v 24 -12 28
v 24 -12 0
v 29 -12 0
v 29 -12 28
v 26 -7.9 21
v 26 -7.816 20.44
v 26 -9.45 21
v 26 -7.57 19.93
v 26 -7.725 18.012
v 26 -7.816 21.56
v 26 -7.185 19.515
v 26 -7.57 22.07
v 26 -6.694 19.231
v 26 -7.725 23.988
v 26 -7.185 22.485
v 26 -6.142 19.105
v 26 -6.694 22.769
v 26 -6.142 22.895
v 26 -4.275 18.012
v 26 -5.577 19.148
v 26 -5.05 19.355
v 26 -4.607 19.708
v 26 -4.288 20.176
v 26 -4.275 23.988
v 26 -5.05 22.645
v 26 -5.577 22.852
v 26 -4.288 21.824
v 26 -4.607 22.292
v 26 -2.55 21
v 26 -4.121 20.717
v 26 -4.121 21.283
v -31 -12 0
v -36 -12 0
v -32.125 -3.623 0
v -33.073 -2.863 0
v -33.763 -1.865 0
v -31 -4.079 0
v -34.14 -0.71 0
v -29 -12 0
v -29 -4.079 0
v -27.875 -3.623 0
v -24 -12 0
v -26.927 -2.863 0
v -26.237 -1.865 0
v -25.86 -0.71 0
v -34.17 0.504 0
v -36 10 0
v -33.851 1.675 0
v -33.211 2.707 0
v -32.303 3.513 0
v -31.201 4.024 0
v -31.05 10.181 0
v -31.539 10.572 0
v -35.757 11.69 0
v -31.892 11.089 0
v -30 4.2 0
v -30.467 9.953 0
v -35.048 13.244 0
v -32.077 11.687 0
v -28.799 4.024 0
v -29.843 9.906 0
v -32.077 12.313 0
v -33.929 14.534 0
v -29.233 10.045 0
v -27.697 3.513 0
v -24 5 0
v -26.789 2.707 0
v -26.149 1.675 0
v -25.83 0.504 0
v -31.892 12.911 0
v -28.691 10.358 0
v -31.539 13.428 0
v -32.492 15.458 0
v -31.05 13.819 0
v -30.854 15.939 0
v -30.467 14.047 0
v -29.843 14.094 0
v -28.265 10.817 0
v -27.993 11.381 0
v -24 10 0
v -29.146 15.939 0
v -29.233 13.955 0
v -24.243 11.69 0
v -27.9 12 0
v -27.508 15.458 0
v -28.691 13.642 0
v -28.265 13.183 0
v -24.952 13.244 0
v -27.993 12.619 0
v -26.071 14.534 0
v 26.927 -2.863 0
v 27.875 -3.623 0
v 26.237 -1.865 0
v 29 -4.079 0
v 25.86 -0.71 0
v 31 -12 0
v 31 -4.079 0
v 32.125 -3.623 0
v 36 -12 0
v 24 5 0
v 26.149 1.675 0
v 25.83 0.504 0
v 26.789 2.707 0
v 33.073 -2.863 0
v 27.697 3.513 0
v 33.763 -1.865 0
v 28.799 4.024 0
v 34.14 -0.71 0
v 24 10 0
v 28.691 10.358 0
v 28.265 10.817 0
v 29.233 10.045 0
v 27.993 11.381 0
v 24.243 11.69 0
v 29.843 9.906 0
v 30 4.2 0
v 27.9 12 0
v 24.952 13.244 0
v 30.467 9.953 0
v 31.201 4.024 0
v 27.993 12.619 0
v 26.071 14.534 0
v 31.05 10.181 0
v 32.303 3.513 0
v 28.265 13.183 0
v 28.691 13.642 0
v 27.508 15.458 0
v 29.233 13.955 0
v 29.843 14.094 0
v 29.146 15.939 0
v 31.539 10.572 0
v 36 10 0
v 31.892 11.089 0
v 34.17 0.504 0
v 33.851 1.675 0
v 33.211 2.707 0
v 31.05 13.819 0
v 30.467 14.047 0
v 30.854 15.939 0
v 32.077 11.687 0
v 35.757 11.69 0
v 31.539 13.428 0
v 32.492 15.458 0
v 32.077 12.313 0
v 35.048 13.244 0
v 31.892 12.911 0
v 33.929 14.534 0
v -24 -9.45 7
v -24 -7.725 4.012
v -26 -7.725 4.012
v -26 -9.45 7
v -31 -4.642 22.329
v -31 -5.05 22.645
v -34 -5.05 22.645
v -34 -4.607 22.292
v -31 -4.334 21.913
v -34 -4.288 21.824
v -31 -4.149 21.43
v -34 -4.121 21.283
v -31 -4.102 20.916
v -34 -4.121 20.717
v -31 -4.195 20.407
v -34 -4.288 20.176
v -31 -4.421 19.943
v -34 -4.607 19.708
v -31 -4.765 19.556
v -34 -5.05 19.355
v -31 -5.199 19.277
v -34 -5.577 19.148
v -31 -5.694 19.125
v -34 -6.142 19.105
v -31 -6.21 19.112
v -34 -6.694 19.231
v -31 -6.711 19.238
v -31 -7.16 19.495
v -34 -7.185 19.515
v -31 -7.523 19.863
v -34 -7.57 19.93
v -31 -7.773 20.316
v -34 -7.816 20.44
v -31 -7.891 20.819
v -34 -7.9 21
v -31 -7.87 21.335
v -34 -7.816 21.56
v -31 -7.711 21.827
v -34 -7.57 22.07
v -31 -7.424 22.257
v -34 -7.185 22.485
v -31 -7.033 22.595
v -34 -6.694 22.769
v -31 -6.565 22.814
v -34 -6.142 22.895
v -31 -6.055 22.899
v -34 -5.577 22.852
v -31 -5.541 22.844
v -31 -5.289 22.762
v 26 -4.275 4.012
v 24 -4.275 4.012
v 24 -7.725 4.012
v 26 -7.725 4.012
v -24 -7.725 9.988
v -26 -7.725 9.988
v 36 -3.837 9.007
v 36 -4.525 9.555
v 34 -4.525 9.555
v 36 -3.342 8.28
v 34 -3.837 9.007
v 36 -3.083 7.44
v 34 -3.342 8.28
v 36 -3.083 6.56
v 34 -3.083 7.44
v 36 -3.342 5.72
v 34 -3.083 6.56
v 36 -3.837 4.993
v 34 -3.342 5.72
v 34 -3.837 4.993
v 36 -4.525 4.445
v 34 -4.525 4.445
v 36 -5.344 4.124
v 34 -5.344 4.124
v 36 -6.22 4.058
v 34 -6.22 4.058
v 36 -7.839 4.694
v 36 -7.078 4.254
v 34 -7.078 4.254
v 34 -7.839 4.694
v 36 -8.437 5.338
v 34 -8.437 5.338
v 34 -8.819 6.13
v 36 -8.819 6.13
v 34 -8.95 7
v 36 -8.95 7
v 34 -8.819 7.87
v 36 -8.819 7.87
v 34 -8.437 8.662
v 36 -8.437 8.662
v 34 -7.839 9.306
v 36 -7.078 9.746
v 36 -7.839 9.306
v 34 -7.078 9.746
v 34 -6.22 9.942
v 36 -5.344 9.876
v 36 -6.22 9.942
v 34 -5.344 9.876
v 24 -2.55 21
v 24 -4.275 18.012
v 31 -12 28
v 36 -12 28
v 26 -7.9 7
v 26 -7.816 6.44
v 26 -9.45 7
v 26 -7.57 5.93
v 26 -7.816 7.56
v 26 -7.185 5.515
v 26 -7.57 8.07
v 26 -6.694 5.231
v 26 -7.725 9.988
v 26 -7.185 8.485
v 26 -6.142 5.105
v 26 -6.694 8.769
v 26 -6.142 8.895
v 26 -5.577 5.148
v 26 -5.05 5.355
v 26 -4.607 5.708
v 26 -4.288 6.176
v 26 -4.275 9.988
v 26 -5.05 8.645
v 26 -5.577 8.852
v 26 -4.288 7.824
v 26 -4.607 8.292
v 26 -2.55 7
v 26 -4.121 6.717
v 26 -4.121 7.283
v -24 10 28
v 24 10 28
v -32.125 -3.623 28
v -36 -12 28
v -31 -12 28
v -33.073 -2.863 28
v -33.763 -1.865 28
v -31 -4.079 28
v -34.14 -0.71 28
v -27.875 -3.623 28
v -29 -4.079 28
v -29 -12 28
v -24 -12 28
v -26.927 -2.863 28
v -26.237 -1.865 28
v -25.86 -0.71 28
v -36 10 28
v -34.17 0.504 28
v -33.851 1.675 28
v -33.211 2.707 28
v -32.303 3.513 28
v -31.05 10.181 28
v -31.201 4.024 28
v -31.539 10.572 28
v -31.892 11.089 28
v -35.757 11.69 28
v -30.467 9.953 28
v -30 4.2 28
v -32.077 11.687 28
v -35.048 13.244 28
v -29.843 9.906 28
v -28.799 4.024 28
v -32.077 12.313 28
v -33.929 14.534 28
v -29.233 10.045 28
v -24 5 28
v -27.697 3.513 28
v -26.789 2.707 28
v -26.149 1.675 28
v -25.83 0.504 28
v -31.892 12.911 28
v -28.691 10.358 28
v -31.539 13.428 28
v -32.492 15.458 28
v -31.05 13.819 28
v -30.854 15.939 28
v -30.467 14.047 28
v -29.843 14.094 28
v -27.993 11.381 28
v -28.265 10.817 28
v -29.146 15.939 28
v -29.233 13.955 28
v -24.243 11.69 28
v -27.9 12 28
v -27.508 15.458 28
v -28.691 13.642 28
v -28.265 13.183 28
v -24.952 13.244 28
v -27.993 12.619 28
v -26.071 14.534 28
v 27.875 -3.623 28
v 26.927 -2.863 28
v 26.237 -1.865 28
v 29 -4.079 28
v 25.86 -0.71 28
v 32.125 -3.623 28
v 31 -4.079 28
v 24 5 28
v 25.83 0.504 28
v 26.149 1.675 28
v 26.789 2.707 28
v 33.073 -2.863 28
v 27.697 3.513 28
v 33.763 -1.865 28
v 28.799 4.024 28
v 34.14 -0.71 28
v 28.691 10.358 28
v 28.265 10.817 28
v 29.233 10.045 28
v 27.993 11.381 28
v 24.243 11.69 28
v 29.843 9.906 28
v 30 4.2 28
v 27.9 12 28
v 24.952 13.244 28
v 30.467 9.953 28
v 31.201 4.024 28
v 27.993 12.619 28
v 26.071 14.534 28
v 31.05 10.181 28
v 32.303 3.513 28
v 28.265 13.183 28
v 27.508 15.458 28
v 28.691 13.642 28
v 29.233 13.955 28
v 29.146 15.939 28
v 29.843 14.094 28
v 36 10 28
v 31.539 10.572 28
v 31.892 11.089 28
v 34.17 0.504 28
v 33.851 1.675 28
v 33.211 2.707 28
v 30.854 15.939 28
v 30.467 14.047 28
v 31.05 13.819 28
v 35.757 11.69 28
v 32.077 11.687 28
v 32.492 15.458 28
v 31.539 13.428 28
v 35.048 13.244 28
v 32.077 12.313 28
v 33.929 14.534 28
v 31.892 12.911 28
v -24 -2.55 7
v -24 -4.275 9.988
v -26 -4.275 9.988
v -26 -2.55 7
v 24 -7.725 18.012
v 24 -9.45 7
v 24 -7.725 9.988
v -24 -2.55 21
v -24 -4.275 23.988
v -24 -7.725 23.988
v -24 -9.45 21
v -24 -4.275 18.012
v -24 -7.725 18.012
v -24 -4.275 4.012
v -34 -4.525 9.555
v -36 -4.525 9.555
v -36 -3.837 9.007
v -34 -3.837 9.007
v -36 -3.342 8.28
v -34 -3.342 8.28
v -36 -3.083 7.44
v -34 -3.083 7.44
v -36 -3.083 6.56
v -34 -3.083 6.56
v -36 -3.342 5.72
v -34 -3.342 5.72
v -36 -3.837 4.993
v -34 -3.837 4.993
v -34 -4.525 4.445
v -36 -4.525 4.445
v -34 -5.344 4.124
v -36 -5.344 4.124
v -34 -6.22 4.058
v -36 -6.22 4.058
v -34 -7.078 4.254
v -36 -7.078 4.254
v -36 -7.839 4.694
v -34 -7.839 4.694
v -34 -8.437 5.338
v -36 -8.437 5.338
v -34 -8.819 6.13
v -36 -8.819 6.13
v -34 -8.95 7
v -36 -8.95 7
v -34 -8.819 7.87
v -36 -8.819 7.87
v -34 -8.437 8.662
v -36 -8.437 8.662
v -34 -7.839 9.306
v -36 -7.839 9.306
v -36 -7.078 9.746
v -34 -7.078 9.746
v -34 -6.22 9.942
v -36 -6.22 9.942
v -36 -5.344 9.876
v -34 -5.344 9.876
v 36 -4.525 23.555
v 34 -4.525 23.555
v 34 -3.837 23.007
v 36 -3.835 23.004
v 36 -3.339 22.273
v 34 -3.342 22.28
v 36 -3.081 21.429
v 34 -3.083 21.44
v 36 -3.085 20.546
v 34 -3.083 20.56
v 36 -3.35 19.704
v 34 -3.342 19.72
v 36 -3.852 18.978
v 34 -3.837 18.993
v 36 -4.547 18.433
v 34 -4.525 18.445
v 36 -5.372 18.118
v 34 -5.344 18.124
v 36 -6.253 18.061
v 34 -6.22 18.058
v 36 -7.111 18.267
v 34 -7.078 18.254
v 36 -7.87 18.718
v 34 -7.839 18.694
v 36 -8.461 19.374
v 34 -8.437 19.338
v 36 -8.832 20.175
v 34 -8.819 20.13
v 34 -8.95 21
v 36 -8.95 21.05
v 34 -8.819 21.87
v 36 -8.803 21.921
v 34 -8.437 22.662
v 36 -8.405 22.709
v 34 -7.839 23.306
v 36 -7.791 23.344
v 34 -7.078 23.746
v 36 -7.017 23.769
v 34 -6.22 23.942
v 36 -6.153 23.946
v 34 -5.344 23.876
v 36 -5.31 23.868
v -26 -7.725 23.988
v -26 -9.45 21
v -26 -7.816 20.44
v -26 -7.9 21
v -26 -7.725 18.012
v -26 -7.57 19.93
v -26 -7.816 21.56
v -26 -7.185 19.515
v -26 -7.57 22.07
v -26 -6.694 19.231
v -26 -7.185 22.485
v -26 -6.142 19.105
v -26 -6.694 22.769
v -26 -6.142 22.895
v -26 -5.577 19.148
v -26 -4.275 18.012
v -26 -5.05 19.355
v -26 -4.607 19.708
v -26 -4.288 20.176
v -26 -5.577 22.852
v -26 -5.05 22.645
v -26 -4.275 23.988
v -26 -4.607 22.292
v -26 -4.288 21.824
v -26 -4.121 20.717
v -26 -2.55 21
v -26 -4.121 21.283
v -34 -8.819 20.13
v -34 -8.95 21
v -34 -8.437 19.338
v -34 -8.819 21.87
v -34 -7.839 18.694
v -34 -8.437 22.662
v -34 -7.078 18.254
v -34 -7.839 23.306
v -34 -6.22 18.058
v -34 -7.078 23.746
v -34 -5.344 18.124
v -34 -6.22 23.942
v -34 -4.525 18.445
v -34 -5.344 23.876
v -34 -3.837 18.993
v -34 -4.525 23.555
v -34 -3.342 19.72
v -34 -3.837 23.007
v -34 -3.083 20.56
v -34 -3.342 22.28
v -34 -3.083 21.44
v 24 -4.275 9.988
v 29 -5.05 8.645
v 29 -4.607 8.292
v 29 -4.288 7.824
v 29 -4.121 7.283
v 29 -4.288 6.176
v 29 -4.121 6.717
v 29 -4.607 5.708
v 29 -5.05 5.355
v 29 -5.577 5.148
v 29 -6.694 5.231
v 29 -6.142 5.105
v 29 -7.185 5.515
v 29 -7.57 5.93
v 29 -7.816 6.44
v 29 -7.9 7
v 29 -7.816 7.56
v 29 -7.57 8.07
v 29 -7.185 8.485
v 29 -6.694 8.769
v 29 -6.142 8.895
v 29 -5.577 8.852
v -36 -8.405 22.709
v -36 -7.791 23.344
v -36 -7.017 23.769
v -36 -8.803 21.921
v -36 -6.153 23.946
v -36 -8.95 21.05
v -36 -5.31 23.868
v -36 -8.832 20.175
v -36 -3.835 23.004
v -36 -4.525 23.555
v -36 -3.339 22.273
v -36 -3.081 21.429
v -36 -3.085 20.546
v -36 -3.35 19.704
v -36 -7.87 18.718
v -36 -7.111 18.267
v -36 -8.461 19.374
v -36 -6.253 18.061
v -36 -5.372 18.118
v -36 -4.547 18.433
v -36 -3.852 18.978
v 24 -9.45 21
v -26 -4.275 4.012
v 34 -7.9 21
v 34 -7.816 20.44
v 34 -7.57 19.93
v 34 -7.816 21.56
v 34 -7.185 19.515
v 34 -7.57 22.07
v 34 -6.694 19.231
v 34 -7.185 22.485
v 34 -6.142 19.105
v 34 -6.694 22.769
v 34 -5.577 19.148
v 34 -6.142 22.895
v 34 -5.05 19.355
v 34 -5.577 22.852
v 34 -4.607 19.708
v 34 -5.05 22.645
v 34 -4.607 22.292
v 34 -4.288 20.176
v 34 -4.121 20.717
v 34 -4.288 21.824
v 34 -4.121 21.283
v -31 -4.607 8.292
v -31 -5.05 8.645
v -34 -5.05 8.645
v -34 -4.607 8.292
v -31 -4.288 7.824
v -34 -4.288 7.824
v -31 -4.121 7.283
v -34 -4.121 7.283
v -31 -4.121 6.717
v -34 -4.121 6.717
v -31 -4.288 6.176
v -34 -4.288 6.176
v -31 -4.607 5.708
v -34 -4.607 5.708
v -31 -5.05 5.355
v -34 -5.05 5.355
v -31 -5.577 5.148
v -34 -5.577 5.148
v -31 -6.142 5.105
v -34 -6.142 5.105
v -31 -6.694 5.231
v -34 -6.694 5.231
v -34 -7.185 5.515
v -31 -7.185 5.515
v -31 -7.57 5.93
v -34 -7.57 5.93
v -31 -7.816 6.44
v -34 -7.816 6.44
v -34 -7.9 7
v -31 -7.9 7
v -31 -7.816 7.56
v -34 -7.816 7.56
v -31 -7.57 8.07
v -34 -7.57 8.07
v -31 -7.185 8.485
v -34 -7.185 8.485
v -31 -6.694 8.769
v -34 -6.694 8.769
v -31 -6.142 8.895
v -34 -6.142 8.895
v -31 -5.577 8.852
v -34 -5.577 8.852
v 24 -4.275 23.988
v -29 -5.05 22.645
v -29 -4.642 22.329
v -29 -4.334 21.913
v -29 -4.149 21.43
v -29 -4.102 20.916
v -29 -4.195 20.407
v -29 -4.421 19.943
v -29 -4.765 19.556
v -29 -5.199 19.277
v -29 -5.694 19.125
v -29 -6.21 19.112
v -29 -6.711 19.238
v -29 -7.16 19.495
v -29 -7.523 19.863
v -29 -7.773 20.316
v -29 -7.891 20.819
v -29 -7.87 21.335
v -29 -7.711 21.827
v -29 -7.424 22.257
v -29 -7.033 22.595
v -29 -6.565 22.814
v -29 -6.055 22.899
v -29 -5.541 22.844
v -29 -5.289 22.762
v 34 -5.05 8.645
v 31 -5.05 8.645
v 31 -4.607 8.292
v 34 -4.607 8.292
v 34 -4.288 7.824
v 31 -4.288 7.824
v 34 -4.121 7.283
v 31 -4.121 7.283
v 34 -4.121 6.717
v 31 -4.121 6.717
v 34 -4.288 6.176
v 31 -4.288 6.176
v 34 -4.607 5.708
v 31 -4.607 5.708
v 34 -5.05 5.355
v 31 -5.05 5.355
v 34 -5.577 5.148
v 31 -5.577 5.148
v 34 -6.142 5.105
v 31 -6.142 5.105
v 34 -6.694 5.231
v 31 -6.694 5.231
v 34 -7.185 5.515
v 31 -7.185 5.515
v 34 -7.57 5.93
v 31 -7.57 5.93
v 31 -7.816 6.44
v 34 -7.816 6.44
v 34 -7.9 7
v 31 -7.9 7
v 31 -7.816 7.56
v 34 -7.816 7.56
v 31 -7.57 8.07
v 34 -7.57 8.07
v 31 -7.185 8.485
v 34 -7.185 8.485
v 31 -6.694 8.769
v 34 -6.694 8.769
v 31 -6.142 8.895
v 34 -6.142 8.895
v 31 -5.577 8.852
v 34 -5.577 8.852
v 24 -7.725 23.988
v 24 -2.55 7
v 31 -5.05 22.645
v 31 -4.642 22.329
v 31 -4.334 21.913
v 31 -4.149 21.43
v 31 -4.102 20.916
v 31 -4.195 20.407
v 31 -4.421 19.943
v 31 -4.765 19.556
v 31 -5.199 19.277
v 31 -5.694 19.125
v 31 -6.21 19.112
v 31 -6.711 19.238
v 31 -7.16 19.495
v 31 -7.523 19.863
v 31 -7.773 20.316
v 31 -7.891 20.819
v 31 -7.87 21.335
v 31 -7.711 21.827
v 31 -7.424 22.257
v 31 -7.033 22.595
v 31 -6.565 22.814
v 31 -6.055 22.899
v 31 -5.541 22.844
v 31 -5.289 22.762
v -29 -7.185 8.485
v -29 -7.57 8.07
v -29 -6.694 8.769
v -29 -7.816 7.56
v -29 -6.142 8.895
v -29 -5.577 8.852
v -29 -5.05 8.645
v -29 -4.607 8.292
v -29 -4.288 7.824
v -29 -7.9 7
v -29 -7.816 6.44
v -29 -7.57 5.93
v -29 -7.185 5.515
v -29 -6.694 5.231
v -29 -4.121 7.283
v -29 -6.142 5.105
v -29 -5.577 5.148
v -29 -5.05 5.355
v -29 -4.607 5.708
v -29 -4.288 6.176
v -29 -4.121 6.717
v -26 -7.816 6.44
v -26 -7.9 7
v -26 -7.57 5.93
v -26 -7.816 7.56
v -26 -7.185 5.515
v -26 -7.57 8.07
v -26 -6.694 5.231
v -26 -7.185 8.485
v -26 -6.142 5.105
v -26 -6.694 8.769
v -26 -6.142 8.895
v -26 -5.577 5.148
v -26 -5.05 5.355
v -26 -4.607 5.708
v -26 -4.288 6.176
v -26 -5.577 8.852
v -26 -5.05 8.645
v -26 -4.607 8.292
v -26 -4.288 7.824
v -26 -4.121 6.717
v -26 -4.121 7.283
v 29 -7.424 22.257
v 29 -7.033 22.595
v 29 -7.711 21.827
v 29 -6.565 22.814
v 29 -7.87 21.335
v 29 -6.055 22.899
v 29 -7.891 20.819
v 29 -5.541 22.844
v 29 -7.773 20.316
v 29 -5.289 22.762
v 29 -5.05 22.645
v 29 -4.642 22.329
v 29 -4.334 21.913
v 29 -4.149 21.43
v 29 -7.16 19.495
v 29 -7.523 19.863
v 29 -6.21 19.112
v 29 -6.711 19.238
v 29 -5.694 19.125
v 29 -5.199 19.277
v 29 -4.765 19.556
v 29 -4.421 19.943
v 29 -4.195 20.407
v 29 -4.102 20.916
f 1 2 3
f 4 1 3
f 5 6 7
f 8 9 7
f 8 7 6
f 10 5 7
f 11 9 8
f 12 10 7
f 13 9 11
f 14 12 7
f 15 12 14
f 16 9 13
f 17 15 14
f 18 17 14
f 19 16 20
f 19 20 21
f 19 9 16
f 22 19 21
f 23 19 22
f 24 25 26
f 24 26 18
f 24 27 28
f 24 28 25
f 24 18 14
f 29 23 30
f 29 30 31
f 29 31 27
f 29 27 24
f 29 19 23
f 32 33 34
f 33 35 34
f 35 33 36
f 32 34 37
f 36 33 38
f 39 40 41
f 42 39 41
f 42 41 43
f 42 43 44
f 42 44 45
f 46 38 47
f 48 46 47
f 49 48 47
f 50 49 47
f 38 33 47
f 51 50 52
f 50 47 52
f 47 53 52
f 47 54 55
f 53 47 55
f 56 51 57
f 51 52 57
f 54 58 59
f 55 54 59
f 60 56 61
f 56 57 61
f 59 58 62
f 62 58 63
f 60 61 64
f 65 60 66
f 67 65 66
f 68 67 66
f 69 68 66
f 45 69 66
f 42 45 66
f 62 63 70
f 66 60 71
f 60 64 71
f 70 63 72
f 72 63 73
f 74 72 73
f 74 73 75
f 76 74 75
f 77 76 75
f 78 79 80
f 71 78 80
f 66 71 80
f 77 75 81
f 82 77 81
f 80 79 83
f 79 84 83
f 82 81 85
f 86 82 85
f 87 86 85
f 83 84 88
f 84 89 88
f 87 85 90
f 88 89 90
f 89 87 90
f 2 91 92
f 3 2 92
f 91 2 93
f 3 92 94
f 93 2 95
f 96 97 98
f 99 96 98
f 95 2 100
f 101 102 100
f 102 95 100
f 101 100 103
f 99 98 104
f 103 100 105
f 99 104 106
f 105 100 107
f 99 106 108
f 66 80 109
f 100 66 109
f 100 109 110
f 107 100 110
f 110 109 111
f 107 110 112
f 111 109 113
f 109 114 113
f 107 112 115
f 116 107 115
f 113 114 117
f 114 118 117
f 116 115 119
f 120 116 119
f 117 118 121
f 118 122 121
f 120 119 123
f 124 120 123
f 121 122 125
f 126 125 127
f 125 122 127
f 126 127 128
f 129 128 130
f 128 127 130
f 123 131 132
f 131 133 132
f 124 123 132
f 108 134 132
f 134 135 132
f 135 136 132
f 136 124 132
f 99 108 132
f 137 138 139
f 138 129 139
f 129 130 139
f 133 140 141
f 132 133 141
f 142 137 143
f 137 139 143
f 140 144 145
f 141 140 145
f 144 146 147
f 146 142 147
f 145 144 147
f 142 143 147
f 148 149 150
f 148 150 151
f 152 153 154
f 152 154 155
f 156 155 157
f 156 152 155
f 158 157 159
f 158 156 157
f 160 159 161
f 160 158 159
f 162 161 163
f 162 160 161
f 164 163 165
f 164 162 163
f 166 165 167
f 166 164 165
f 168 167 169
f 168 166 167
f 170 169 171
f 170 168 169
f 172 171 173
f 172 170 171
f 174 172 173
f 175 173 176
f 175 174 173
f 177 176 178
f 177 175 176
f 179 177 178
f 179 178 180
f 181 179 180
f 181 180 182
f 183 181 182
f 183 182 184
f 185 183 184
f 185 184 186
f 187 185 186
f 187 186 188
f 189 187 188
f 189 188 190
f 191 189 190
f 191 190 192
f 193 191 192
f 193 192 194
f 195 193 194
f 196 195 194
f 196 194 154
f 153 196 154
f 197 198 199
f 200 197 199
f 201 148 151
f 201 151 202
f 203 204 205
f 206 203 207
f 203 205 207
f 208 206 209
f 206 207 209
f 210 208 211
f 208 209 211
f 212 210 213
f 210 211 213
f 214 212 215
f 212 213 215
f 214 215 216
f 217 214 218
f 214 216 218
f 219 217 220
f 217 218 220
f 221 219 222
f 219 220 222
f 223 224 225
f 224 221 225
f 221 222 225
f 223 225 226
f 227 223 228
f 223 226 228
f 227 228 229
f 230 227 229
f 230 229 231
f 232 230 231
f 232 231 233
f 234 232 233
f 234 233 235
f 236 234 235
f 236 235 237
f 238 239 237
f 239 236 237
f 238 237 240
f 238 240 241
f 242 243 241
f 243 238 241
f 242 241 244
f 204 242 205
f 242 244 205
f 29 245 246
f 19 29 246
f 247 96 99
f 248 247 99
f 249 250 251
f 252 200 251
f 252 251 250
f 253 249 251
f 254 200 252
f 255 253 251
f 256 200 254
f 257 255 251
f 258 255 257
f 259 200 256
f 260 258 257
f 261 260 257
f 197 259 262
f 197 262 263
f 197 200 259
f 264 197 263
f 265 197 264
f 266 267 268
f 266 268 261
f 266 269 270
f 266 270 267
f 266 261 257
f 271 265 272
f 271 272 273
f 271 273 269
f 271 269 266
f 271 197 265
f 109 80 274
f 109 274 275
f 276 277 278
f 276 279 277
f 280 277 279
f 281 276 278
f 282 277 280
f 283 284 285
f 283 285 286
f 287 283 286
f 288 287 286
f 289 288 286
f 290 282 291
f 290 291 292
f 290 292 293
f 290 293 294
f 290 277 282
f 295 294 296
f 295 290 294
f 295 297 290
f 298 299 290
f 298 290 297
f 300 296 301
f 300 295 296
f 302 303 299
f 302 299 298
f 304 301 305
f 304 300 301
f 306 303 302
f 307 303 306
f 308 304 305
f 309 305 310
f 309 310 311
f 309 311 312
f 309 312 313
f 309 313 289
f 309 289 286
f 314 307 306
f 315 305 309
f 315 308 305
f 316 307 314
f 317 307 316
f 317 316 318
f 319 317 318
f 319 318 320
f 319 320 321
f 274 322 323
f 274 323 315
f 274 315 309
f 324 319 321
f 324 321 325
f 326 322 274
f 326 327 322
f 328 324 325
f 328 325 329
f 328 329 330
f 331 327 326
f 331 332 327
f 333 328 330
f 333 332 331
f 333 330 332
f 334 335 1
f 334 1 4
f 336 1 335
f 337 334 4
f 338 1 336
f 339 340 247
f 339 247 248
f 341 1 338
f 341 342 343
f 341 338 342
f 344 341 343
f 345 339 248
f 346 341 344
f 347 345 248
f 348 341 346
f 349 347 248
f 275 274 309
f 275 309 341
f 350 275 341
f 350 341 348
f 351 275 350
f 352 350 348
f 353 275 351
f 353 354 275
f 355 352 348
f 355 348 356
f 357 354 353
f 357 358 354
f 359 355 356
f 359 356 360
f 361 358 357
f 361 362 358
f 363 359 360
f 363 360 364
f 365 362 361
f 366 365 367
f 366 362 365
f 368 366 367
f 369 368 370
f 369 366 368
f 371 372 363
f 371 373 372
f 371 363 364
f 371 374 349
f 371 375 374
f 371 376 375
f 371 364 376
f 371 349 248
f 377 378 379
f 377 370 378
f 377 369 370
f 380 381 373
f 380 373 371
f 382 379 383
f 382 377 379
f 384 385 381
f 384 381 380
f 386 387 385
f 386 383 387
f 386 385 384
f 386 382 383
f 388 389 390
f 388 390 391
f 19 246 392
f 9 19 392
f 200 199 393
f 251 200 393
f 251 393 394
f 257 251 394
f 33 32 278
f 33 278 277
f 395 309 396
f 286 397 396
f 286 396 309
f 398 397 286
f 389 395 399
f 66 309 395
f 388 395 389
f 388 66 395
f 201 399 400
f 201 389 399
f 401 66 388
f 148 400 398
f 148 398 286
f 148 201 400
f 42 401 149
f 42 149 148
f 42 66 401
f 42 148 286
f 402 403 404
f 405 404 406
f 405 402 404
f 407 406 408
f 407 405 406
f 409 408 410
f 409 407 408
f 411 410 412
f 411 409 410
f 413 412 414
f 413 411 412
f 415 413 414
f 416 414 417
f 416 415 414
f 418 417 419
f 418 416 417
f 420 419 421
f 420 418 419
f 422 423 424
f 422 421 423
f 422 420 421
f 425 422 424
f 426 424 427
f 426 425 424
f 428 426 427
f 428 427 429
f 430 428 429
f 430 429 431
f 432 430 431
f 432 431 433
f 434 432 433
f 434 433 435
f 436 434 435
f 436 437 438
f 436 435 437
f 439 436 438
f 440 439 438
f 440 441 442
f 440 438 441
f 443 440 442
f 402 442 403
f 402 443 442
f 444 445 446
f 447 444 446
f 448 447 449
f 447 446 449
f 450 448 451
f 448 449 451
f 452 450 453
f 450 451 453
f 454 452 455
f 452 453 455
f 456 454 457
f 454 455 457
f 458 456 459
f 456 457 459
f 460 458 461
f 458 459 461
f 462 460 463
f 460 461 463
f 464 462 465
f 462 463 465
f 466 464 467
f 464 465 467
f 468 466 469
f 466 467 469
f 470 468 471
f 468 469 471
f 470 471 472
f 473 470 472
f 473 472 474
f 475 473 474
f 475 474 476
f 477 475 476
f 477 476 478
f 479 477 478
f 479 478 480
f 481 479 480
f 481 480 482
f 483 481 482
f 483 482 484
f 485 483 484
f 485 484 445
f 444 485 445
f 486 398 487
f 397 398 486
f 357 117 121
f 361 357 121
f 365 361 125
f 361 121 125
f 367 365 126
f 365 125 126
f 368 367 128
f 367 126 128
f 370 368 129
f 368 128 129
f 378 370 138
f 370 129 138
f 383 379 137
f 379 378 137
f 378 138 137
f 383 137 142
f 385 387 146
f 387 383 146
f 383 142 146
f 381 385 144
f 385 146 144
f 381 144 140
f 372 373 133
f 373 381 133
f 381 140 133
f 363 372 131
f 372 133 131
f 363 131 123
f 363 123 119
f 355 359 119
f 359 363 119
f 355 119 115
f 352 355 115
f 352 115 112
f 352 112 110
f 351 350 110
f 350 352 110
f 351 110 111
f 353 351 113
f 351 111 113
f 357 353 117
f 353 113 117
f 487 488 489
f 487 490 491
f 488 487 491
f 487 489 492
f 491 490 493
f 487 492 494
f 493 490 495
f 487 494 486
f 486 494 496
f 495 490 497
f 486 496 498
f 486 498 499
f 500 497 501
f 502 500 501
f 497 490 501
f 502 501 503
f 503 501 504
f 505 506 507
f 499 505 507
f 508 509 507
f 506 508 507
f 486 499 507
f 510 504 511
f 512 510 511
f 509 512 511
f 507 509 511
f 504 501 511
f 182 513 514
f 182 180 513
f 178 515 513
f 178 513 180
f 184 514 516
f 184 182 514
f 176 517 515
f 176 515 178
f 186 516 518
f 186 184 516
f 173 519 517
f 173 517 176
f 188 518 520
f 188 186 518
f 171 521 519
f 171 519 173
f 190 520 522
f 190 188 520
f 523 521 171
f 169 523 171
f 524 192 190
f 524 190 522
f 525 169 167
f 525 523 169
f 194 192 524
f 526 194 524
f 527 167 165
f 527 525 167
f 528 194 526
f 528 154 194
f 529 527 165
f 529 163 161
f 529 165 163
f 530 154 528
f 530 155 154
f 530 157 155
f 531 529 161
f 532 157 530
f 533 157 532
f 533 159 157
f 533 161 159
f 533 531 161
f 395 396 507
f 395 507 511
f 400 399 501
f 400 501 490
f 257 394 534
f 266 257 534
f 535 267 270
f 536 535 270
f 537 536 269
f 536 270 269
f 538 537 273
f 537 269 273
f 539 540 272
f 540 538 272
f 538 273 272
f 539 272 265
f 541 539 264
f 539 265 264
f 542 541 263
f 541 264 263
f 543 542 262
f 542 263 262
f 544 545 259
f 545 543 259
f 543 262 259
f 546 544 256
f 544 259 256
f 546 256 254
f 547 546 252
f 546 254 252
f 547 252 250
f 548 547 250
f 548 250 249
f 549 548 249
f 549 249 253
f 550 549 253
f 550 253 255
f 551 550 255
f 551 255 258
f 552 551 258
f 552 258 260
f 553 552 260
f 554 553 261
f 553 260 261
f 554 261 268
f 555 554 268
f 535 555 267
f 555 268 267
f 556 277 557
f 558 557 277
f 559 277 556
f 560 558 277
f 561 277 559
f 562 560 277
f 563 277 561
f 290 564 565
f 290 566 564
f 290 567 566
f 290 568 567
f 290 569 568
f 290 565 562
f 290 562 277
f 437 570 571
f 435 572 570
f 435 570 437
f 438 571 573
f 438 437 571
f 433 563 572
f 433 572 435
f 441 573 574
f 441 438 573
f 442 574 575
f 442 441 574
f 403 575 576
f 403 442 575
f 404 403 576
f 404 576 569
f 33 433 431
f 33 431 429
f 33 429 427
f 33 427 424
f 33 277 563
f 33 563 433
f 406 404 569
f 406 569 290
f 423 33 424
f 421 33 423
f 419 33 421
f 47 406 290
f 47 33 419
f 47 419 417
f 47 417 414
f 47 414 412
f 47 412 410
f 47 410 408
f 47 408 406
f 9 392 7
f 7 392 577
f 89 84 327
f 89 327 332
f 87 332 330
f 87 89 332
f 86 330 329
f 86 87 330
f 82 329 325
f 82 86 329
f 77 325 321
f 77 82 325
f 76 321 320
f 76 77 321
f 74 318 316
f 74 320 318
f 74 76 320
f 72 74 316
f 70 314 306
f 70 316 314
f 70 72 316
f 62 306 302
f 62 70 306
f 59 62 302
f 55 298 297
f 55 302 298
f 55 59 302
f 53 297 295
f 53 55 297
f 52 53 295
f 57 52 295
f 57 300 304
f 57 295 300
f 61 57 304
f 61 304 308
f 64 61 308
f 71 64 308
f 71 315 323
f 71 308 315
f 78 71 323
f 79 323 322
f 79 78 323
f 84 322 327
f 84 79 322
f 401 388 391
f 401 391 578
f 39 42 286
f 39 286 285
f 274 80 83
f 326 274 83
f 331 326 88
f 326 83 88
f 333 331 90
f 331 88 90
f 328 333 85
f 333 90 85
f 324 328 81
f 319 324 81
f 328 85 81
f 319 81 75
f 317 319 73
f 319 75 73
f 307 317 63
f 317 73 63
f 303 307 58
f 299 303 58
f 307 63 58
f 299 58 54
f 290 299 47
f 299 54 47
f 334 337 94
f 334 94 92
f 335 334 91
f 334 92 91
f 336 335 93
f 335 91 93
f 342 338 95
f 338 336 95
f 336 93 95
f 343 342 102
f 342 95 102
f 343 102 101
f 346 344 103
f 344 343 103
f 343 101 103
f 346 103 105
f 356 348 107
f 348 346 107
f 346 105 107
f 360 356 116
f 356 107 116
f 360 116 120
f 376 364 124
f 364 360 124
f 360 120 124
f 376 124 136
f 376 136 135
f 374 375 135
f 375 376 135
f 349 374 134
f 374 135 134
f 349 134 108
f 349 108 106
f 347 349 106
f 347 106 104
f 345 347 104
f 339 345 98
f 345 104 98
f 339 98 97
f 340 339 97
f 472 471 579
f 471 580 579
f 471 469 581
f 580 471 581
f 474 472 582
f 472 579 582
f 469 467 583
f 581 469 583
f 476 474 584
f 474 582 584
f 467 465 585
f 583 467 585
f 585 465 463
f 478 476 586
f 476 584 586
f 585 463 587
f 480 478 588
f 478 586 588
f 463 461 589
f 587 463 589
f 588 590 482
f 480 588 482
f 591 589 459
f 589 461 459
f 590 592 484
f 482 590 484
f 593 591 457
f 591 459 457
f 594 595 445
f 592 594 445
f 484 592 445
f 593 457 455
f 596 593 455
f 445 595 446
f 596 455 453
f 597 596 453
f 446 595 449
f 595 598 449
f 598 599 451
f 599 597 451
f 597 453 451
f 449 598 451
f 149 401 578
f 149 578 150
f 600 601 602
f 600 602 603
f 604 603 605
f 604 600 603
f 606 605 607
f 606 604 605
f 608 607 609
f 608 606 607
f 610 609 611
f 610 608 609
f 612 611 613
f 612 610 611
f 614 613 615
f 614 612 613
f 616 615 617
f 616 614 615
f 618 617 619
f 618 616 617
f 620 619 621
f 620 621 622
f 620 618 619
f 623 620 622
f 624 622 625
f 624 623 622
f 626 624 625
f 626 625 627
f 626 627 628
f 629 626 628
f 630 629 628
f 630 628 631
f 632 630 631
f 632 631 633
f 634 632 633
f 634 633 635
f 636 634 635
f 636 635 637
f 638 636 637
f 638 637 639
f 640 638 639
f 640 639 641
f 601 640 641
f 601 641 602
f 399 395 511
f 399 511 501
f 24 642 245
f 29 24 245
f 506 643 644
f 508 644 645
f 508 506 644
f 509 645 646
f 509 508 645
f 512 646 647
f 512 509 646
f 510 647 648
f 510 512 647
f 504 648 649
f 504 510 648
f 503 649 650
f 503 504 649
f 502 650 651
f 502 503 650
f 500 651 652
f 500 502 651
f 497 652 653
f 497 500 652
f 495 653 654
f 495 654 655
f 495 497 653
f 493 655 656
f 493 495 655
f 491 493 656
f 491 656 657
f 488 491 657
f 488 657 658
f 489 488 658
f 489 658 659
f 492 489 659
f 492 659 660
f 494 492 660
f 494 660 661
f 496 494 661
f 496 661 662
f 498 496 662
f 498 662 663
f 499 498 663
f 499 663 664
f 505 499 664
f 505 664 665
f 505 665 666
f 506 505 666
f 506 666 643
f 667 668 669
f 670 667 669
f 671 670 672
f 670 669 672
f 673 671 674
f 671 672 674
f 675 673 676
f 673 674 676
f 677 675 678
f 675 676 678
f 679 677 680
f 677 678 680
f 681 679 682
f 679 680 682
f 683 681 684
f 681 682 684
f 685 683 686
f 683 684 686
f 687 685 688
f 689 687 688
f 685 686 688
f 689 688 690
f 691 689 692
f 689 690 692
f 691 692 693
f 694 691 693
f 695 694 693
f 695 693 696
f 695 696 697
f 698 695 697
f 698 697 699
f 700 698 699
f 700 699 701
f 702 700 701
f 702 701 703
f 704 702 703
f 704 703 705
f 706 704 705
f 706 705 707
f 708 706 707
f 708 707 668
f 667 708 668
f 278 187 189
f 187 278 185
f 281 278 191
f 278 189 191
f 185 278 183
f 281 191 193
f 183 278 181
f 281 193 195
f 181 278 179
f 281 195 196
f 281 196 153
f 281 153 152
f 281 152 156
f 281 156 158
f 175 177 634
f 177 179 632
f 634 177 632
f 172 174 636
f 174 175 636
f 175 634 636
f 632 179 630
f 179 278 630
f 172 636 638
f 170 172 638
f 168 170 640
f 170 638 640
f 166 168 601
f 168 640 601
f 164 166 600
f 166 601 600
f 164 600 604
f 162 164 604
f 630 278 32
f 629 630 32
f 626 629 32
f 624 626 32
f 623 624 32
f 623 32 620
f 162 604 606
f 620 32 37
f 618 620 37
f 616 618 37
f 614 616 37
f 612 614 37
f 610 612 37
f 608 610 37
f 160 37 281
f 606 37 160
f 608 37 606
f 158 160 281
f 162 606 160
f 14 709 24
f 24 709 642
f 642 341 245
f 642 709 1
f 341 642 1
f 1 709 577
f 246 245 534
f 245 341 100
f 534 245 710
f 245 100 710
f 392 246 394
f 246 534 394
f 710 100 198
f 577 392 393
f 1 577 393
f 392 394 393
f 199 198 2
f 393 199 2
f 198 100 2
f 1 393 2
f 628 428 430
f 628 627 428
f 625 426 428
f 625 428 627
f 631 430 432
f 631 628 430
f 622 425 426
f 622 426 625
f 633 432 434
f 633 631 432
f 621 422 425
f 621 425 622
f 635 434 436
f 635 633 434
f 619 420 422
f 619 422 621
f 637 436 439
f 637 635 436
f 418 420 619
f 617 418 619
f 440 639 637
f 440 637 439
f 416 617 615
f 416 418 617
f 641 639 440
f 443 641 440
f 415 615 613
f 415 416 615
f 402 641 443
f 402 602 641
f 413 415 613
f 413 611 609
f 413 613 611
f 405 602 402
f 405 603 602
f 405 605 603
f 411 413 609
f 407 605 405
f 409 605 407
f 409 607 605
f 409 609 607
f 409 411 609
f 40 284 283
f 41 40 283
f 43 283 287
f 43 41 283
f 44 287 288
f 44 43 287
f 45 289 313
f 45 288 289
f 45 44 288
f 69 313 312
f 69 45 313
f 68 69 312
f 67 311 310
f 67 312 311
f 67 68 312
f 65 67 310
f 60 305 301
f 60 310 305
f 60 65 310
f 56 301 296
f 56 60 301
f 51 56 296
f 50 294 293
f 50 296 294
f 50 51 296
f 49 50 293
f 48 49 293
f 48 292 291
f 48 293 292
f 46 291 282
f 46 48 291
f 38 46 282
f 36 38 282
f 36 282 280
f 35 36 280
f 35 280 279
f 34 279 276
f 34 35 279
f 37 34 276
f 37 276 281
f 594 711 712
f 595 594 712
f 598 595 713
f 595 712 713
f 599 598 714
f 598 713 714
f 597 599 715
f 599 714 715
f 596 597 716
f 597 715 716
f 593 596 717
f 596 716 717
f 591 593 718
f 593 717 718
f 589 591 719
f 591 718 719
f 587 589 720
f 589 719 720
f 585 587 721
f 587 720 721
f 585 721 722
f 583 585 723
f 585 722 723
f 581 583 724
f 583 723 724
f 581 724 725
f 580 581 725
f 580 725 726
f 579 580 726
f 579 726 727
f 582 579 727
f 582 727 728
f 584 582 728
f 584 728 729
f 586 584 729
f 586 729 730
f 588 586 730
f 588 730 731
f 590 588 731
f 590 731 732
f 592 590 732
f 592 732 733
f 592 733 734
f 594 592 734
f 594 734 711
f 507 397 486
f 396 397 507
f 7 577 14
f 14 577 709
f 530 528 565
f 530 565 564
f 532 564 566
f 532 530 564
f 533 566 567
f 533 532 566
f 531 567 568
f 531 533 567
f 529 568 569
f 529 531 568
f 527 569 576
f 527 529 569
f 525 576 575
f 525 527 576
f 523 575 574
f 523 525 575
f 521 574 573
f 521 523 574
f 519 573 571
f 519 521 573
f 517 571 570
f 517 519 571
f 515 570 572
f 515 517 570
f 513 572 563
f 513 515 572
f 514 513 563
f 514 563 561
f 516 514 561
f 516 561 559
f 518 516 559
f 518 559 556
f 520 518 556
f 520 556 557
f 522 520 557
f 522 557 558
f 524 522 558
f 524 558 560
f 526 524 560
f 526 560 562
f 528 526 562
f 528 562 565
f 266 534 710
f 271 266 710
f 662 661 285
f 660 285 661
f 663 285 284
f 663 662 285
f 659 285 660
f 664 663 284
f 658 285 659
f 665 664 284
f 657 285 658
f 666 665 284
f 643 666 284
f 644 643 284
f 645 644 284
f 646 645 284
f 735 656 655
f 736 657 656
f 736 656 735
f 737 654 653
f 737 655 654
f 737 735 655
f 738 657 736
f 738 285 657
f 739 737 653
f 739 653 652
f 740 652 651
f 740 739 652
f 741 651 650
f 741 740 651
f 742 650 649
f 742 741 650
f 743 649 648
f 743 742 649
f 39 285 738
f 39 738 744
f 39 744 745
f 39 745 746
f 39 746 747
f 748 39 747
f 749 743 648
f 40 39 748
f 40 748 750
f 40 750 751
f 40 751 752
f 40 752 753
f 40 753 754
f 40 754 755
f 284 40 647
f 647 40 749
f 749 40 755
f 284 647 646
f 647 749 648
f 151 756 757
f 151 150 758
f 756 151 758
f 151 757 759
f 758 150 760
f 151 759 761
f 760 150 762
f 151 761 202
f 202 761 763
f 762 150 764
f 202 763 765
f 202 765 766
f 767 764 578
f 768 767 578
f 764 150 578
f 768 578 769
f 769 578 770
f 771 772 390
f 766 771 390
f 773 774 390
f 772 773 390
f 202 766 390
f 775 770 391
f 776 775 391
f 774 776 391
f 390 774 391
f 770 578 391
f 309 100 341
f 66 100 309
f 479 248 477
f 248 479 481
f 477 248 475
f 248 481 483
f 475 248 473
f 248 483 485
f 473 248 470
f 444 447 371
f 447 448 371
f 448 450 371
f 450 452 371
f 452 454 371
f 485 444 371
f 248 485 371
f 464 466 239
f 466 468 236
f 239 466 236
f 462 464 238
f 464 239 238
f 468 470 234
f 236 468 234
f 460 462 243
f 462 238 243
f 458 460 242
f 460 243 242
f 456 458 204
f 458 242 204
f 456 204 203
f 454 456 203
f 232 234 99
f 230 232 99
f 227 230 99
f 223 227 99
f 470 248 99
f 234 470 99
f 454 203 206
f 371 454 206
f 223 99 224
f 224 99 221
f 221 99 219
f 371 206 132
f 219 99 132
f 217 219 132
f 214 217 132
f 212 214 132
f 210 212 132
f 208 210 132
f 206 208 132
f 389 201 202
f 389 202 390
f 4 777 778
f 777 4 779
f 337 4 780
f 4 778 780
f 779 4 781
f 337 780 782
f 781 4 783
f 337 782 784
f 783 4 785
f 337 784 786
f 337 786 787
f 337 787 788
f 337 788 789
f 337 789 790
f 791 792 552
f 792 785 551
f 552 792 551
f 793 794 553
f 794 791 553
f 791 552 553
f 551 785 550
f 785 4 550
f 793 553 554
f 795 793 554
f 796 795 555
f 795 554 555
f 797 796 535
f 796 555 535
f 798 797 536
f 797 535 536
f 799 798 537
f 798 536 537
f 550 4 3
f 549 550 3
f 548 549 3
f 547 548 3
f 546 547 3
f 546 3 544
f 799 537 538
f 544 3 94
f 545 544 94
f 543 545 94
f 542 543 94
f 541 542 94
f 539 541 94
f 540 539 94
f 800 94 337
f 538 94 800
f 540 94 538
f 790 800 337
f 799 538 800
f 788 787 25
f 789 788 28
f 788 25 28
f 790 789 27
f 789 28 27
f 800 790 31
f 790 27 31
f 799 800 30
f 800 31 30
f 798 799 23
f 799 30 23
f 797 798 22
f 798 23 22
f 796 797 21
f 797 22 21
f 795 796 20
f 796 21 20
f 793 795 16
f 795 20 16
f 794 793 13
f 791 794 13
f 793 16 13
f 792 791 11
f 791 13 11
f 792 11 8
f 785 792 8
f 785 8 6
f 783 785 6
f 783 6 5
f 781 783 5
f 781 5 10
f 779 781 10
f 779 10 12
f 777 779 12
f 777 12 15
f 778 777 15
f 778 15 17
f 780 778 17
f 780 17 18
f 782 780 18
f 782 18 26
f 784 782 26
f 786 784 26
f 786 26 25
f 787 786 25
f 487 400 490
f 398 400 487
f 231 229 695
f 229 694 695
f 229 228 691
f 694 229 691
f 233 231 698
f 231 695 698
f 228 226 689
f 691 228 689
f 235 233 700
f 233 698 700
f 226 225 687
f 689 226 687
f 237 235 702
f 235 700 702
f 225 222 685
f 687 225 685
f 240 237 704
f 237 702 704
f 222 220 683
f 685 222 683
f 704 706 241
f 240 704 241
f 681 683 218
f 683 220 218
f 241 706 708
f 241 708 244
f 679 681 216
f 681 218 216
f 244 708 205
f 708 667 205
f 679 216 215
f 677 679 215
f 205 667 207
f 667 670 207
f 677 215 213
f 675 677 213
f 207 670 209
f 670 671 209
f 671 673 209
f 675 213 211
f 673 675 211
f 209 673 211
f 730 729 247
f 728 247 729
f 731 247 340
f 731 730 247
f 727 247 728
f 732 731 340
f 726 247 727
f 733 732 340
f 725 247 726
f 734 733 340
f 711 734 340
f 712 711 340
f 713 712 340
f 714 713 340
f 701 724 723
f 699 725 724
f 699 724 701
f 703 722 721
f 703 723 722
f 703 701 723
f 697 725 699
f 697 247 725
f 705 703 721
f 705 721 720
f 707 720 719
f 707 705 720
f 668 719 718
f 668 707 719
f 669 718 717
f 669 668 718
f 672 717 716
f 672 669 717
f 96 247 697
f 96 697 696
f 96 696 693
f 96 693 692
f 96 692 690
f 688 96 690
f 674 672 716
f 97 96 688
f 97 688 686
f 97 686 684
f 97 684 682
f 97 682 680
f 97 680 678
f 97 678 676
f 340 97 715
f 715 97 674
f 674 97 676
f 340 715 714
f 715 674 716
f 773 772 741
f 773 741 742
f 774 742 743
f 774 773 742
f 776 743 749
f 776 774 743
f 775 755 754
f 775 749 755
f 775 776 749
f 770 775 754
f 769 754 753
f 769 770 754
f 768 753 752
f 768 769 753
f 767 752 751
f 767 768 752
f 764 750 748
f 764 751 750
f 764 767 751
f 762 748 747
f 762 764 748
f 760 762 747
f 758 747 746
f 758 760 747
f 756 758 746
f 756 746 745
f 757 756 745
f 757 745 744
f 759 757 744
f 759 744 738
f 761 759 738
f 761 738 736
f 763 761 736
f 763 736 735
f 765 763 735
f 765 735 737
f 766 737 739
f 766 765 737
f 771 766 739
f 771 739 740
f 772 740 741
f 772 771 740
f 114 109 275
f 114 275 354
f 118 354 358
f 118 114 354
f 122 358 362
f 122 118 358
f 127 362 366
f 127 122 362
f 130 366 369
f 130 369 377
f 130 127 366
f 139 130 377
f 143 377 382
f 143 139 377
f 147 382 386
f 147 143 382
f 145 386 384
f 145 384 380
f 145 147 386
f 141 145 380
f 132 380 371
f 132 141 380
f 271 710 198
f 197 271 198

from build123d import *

# Parameters (mm, degrees)
CYLINDER001_R          = 2.1
CYLINDER001_DEPTH      = 30
CYLINDER003_R          = 2.95
CYLINDER003_DEPTH      = 4
CYLINDER002_R          = 1.9
CYLINDER002_DEPTH      = 10
PRISM_DEPTH            = 3
FUSION_ROLL_ANGLE      = -90
FUSION_PITCH_ANGLE     = -60
FUSION_PLACEMENT_ANGLE = 90
CLONE_ROLL_ANGLE       = -3.3e-05
CLONE_PITCH_ANGLE      = -2.6e-05
CLONE_PLACEMENT_ANGLE  = 7e-06
SKETCH001_W            = 2
SKETCH001_H            = 14
PAD001_DEPTH           = 30
CYLINDER_R             = 4.2
CYLINDER_DEPTH         = 30
PAD_DEPTH              = 28


with BuildPart() as top_screw_cut:
    # Cylinder001 → Cylinder001 (new body)
    with BuildSketch(Plane(origin=(-30, 12, -1), x_dir=(1, 0, 0), z_dir=(0, 0, 1))):
        Circle(CYLINDER001_R)
    extrude(amount=CYLINDER001_DEPTH)


with BuildPart() as cylinder001:
    # Cylinder003 → Cylinder003 (new body)
    with BuildSketch(Plane.XY.offset(10)):
        Circle(CYLINDER003_R)
    extrude(amount=CYLINDER003_DEPTH)


with BuildPart() as cylinder:
    # Cylinder002 → Cylinder002 (new body)
    with BuildSketch(Plane.XY):
        Circle(CYLINDER002_R)
    extrude(amount=CYLINDER002_DEPTH)


with BuildPart() as fusion:
    # Prism → Prism (new body)
    with BuildSketch(Plane.XY.offset(-1)):
        Polygon((3.45, 0), (1.725, 2.987788), (-1.725, 2.987788), (-3.45, 0), (-1.725, -2.987788), (1.725, -2.987788), align=None)
    extrude(amount=PRISM_DEPTH)

    # Fusion: union Cylinder001, Cylinder
    add(cylinder001.part)
    add(cylinder.part)


with BuildPart() as fusion_1:
    # Fusion roll: moved
    add(fusion.part.rotate(Axis((0, 0, 0), (1, 0, 0)), FUSION_ROLL_ANGLE))


with BuildPart() as fusion_2:
    # Fusion pitch: moved
    add(fusion_1.part.rotate(Axis((0, 0, 0), (0, 1, 0)), FUSION_PITCH_ANGLE))


with BuildPart() as fusion_3:
    # Fusion placement: moved
    add(fusion_2.part.moved(Location((-24, -6, 7))).rotate(Axis((-24, -6, 7), (0, 0, 1)), FUSION_PLACEMENT_ANGLE))


with BuildPart() as clamps_screw_cut:
    # Clone base: copy of Fusion
    add(fusion_3.part)


with BuildPart() as clamps_screw_cut_1:
    # Clone roll: moved
    add(clamps_screw_cut.part.rotate(Axis((0, 0, 0), (1, 0, 0)), CLONE_ROLL_ANGLE))


with BuildPart() as clamps_screw_cut_2:
    # Clone pitch: moved
    add(clamps_screw_cut_1.part.rotate(Axis((0, 0, 0), (0, 1, 0)), CLONE_PITCH_ANGLE))


with BuildPart() as clamps_screw_cut_3:
    # Clone placement: moved
    add(clamps_screw_cut_2.part.moved(Location((2e-06, -1e-06, 14.000007))).rotate(Axis((2e-06, -1e-06, 14.000007), (0, 0, 1)), CLONE_PLACEMENT_ANGLE))

    # Fusion001: union Fusion
    add(fusion_3.part)


with BuildPart() as clamps_relief_cut:
    # Sketch001 → Pad001 (new body)
    with BuildSketch(Plane.XY.offset(-1)):
        with Locations((-30, -7)):
            Rectangle(SKETCH001_W, SKETCH001_H)
    extrude(amount=PAD001_DEPTH)


with BuildPart() as fusion002:
    # Cylinder → Cylinder (new body)
    with BuildSketch(Plane(origin=(-30, 0, -1), x_dir=(1, 0, 0), z_dir=(0, 0, 1))):
        Circle(CYLINDER_R)
    extrude(amount=CYLINDER_DEPTH)

    # Fusion002: union Top_screw_cut, Clamps_Screw_cut, Clamps_Relief_cut
    add(top_screw_cut.part)
    add(clamps_screw_cut_3.part)
    add(clamps_relief_cut.part)


with BuildPart() as cut:
    # Sketch → Pad (new body)
    with BuildSketch(Plane.XY):
        with BuildLine():
            ThreePointArc((-24, 10), (-30, 16), (-36, 10))
            Line((-36, -12), (-36, 10))
            Line((-24, -12), (-36, -12))
            Line((-24, 5), (-24, -12))
            Line((0, 5), (-24, 5))
            Line((0, 10), (0, 5))
            Line((-24, 10), (0, 10))
        make_face()
    extrude(amount=PAD_DEPTH)

    # Cut: cut Fusion002
    add(fusion002.part, mode=Mode.SUBTRACT)


with BuildPart() as fusion003:
    # Part__Mirroring: instance of Cut
    add(cut.part.mirror(Plane(origin=(0, 0, 0), x_dir=(0, -1, 0), z_dir=(1, 0, 0))))

    # Fusion003: union Cut
    add(cut.part)


solid = fusion003.part
